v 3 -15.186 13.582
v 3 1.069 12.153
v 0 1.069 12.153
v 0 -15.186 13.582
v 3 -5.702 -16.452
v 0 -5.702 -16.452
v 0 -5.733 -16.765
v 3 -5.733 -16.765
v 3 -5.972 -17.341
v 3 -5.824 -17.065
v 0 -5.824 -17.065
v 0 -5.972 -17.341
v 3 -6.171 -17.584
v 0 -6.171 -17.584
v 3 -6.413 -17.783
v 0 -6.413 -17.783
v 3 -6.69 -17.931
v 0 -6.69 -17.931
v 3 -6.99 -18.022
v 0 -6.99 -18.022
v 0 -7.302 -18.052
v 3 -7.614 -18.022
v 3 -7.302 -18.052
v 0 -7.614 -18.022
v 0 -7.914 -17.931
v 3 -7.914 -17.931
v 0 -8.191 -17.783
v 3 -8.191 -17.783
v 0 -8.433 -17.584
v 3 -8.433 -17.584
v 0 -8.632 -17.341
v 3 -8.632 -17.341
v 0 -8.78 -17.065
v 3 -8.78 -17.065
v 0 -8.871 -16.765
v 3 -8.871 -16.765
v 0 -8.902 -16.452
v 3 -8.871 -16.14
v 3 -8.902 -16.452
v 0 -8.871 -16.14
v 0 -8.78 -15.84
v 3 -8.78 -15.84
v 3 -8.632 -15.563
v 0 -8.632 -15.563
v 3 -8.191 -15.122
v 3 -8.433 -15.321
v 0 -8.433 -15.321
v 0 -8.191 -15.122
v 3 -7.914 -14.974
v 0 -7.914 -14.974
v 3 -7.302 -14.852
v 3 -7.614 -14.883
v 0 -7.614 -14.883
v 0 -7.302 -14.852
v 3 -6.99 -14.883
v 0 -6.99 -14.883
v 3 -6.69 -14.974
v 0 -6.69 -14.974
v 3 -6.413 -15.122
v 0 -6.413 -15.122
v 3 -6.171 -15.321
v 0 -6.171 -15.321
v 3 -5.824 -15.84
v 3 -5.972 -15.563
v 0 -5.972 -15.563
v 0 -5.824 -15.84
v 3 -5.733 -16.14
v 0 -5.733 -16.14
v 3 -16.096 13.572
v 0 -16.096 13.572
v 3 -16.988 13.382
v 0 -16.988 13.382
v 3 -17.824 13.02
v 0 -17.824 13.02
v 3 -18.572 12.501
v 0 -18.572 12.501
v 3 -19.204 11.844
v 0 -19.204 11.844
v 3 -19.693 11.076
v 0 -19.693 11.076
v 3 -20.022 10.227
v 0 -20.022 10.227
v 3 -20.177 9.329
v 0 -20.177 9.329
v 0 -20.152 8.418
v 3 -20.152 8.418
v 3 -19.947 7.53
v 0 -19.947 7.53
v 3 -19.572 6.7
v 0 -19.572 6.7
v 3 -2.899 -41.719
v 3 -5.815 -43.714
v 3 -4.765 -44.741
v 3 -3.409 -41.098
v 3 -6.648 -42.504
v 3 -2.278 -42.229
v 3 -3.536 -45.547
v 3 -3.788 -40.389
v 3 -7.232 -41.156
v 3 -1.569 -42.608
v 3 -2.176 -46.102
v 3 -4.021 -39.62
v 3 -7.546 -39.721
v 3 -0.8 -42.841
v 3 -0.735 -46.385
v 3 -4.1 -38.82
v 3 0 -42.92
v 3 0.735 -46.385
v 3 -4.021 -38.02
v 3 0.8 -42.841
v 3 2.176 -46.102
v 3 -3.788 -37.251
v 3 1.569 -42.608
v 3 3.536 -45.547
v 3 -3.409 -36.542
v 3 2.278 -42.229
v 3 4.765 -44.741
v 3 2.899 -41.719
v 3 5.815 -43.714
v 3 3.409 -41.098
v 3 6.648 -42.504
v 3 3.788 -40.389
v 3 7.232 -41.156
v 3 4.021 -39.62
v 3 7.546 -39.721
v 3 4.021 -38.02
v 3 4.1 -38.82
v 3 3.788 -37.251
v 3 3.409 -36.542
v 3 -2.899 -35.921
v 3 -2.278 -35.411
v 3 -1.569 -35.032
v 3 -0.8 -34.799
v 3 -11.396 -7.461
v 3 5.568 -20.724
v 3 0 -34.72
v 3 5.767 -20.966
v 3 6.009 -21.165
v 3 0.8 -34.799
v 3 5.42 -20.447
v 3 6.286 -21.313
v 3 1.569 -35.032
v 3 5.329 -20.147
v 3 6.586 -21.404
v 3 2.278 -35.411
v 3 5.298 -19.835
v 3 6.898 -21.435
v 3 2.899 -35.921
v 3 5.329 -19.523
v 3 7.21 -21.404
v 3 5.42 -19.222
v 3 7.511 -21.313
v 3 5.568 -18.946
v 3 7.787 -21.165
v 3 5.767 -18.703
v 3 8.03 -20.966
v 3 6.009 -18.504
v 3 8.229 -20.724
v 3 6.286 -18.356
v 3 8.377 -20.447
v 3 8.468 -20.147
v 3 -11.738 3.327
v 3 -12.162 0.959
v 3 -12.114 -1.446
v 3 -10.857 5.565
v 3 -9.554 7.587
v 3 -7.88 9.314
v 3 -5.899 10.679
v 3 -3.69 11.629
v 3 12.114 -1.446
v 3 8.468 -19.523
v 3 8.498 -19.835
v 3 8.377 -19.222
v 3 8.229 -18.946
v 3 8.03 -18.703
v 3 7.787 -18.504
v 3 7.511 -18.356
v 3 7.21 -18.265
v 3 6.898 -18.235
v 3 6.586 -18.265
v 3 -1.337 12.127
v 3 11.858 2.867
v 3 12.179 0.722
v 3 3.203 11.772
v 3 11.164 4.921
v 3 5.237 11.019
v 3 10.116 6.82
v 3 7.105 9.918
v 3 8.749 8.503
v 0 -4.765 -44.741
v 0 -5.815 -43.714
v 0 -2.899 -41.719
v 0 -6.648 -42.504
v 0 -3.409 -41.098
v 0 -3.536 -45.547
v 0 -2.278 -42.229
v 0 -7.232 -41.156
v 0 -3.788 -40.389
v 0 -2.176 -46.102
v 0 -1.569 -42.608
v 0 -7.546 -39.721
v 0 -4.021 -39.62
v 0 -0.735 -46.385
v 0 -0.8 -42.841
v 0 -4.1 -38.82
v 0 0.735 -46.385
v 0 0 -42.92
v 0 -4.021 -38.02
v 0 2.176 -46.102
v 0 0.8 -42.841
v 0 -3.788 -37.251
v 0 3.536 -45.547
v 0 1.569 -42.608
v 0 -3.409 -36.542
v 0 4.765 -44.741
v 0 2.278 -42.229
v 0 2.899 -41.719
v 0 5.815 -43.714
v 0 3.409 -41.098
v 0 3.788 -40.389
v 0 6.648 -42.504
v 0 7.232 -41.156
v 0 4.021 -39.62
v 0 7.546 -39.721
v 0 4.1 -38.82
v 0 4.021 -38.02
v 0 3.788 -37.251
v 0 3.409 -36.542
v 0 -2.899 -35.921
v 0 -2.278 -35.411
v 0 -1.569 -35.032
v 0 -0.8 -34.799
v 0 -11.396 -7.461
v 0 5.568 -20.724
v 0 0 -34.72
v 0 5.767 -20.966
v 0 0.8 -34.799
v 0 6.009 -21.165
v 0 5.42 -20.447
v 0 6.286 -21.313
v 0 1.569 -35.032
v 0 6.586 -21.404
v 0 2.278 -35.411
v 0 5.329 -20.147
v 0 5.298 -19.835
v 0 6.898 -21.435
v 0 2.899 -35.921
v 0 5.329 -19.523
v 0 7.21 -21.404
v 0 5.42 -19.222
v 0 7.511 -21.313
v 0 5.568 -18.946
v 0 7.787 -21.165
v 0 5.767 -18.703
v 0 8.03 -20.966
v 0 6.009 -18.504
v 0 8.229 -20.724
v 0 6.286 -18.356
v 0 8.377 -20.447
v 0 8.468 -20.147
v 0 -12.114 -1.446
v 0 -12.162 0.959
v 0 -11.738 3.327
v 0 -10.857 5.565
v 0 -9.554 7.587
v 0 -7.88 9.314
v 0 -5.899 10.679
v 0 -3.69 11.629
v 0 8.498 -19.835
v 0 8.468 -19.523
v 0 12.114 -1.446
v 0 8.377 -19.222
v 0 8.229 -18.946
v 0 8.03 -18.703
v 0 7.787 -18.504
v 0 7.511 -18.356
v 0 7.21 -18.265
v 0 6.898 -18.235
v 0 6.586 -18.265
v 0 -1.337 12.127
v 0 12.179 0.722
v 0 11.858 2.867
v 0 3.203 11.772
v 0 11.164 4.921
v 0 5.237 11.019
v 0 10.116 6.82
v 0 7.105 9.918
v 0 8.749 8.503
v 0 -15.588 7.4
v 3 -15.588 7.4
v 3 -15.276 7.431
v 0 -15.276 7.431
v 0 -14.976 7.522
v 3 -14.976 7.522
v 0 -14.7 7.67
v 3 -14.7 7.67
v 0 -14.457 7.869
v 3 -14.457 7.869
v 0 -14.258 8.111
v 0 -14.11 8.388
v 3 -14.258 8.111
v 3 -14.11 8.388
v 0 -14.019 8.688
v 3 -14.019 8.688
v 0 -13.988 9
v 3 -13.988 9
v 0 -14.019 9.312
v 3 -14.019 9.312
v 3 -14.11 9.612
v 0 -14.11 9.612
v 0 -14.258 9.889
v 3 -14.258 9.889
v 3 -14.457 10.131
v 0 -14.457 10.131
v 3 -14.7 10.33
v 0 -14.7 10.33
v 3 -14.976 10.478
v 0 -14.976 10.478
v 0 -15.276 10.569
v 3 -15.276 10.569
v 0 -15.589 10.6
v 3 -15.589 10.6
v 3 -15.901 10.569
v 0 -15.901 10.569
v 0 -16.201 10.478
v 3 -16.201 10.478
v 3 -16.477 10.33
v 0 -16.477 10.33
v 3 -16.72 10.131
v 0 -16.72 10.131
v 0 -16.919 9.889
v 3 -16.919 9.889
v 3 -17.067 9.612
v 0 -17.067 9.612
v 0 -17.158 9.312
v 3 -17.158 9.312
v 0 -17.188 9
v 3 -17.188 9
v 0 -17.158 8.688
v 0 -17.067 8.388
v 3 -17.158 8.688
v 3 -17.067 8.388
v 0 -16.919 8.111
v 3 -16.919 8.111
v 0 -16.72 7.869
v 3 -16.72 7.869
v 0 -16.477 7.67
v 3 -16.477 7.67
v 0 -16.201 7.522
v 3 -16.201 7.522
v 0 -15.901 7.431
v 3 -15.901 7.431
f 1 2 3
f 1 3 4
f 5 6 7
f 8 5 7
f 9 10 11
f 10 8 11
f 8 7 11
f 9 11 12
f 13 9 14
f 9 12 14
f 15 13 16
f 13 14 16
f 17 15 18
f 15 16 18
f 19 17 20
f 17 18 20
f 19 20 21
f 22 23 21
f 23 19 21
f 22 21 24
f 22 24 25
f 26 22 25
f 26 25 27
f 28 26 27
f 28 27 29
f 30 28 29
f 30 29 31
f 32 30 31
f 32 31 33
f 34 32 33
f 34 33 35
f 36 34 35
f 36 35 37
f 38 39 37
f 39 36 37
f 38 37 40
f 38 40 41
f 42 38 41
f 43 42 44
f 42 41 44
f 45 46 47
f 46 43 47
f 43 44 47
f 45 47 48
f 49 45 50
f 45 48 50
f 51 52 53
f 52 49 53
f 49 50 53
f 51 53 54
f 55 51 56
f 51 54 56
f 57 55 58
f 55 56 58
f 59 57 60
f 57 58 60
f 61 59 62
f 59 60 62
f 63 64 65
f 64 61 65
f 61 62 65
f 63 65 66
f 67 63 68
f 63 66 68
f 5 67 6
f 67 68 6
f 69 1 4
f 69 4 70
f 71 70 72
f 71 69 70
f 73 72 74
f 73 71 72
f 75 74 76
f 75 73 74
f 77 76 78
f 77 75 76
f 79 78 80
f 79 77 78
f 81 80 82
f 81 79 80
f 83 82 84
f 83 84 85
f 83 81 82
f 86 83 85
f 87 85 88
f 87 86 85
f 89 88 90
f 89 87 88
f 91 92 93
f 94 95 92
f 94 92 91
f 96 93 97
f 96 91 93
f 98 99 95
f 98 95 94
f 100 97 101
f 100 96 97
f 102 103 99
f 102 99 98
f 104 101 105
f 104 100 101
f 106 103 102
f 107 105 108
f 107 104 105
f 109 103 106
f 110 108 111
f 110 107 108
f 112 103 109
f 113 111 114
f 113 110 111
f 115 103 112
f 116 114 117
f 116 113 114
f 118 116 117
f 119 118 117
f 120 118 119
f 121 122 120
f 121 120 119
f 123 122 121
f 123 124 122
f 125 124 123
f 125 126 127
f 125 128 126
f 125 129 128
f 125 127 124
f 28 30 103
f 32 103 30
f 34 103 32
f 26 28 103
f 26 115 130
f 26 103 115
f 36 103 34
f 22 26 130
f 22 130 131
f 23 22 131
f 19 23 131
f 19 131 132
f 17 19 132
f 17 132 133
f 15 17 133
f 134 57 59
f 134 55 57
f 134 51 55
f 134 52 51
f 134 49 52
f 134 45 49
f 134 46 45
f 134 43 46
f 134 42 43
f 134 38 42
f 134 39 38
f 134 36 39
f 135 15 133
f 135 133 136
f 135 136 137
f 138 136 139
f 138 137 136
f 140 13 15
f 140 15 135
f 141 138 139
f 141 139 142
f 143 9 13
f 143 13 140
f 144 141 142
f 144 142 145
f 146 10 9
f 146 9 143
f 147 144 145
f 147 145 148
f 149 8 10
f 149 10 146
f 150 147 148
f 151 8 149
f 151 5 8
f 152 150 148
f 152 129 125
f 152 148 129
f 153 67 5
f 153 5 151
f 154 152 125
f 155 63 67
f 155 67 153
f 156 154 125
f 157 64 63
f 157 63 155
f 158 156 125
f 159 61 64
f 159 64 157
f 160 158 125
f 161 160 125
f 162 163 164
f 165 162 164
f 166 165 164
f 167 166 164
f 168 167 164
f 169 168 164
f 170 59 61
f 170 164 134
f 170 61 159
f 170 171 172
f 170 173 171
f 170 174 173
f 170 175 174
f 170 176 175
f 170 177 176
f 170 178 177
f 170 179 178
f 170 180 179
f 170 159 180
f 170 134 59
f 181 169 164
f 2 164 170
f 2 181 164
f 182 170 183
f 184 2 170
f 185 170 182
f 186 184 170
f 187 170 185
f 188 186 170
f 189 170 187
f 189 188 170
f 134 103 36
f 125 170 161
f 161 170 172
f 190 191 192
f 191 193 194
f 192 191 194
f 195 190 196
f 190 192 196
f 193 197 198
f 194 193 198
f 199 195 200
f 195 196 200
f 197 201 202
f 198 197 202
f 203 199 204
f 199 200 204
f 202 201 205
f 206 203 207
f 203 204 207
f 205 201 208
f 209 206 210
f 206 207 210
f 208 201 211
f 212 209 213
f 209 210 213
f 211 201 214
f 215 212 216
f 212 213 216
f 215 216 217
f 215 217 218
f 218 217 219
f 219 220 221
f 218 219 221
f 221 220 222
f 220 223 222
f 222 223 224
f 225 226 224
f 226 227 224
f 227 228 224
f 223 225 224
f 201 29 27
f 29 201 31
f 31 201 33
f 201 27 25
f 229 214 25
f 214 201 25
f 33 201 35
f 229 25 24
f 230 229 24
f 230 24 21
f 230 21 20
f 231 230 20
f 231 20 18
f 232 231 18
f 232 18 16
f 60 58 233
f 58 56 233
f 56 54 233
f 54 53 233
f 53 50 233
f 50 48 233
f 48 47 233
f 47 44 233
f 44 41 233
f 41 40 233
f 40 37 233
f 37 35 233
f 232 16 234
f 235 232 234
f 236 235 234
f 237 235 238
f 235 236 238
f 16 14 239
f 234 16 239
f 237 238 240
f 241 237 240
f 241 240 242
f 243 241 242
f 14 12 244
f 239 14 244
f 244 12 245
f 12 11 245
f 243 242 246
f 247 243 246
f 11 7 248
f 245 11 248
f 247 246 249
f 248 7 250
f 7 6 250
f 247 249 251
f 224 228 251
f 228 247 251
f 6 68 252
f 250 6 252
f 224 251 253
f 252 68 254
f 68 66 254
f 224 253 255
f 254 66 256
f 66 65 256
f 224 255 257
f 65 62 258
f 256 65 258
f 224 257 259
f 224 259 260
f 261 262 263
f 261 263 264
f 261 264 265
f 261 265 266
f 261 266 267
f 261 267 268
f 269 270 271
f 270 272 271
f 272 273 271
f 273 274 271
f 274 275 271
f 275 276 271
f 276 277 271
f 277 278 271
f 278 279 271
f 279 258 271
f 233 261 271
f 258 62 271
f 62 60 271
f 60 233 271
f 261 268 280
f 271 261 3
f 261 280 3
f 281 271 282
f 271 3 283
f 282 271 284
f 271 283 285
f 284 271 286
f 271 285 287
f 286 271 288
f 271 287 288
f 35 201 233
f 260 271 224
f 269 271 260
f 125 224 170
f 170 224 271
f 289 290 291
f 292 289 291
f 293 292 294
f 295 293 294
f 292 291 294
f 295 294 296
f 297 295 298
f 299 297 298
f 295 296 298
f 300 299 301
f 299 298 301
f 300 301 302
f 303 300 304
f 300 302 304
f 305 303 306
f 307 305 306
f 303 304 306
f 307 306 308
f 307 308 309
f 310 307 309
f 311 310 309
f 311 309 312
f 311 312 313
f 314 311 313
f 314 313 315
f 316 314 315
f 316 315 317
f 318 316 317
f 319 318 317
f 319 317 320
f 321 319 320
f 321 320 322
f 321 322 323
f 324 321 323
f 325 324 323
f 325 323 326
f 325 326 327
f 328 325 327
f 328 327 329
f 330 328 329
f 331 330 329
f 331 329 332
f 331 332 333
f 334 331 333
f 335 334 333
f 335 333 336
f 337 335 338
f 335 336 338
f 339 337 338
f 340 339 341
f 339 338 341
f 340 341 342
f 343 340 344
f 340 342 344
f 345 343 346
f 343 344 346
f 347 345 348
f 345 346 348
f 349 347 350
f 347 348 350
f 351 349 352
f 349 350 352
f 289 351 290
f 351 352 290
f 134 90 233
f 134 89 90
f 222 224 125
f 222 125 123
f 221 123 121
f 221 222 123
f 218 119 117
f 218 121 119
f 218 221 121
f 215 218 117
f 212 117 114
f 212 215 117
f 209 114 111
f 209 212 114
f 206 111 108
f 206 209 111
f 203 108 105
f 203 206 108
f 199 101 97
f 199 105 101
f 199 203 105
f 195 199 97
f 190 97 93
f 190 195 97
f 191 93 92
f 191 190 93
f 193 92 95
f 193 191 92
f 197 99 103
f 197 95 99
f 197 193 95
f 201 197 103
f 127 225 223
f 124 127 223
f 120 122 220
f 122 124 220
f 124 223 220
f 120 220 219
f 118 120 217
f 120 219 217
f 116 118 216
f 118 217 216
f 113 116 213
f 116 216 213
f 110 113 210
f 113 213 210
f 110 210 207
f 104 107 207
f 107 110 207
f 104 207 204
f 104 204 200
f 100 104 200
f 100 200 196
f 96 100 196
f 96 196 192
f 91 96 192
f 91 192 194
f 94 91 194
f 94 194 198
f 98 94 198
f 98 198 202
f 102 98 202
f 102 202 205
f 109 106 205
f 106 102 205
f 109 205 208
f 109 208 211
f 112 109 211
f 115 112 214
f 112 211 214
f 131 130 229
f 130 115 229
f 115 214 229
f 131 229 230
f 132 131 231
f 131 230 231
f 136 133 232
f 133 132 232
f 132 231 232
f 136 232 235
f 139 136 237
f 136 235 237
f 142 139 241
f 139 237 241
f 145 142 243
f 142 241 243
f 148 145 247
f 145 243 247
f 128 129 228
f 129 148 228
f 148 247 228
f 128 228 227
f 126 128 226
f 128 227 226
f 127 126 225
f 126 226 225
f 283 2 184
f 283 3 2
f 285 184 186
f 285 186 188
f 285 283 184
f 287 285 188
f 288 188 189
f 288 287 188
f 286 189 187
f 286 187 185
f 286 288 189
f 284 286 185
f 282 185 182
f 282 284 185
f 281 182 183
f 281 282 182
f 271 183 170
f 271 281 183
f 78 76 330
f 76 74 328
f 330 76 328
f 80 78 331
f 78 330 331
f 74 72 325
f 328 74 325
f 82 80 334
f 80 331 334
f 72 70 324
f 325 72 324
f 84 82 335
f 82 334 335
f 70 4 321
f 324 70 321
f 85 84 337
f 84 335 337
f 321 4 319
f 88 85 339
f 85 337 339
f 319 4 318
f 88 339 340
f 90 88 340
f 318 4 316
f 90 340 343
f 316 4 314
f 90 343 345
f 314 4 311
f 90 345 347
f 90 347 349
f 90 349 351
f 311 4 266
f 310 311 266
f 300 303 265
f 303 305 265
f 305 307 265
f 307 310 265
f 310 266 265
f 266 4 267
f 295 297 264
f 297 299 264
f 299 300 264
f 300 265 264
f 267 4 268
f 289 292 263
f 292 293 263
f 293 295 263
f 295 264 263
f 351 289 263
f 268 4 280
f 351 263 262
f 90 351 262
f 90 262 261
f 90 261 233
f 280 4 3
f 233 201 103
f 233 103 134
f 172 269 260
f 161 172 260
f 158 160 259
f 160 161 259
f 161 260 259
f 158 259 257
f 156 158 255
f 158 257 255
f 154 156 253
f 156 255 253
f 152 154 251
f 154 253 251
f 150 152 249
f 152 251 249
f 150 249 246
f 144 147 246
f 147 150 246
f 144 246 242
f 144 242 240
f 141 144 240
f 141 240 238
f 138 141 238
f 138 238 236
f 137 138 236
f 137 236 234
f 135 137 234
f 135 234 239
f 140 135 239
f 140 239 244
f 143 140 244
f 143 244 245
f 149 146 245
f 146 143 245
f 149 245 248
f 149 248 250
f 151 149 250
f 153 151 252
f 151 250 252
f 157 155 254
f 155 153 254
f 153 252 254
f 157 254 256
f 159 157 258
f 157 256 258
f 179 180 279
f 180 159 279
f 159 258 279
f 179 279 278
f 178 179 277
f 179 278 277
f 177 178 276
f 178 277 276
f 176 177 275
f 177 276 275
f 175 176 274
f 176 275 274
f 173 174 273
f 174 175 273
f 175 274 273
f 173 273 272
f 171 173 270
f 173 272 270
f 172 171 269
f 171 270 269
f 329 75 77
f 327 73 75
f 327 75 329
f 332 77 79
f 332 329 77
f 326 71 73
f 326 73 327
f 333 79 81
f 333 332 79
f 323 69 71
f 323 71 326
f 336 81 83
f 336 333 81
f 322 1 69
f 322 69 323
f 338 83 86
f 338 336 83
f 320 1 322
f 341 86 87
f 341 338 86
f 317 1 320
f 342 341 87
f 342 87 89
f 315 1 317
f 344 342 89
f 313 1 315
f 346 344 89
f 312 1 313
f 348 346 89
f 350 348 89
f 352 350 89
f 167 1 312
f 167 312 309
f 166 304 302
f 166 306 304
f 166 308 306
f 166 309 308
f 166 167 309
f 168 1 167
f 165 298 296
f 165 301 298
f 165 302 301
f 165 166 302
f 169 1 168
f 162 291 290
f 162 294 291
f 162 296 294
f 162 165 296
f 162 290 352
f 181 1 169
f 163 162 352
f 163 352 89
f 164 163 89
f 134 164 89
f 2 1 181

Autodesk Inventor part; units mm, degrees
ref_plane "YZ Plane" through (0, 0, 0) normal (1, 0, 0) x (0, 1, 0)
ref_plane "XZ Plane" through (0, 0, 0) normal (0, 1, 0) x (-1, 0, 0)
ref_plane "XY Plane" through (0, 0, 0) normal (0, 0, 1) x (1, 0, 0)
sketch "Эскиз1" plane through (0, 0, 0) normal (1, 0, 0) x (0, 1, 0)
  circle A0 centre (35.2311, -22.6062) radius 9.3
  circle A1 centre (0, -38.8201) radius 6.1 construction
  circle A2 centre (0, 0) radius 4.85 construction
  circle A3 centre (35.8147, -49.5529) radius 3.55
  line L0 (6.0968, -38.6237) -> (4.8475, 0.1562) construction
  line L1 (-4.8475, 0.1562) -> (-6.0968, -38.6237) construction
  line L2 (0, 0) -> (0, -38.8201) construction
  circle A4 centre (0, -38.8201) radius 4.1
  circle A5 centre (0, 0) radius 2.25
  circle A6 centre (0, -38.8201) radius 15 construction
  circle A7 centre (0, 0) radius 14 construction
  circle A8 centre (0, -38.8201) radius 7.6
  circle A9 centre (0, 0) radius 7 construction
  line L3 (7.5465, -39.7207) -> (12.114, -1.4456)
  line L4 (-7.5465, -39.7207) -> (-12.114, -1.4456)
  circle A10 centre (0, 0) radius 8.8 construction
  circle A11 centre (0, 0) radius 12.2
  circle A12 centre (6.8983, -19.8347) radius 1.6
  circle A13 centre (-7.3019, -16.4524) radius 1.6
  point P0 (-7, 0)
  point P1 (-7.5465, -39.7207)
  point P2 (-12.114, -1.4456)
  dimension "d0" = 18.6
  dimension "d1" = 12.2
  dimension "d2" = 9.7
  dimension "d3" = 7.1
  dimension "d8" = 38.8201
  dimension "d13" = 38.8
  dimension "d14" = 38.8
  dimension "d23" = 8.2
  dimension "d24" = 4.5
  dimension "d25" = 30
  dimension "d26" = 28
  dimension "d28" = 14
  dimension "d31" = 17.6
  dimension "d32" = 3.4
  dimension "d56" = 3.5
  dimension "d58" = 3.2
  dimension "d59" = 3
  dimension "d60" = 21
  dimension "d61" = 3.2
  dimension "d62" = 3
  dimension "d63" = 18
extrude "Выдавливание4" add sketch "Эскиз1" along normal blind 3 contours A5 | A8 | A8 L4 A11 L3 | A11
sketch "Эскиз4" plane through (0, 0, 0) normal (-1, 0, 0) x (0, 0, 1)
  circle A0 centre (-6.2, 6.2) radius 1.4
  circle A1 centre (-38.8201, 0) radius 4.1 construction
  arc A2 (-1.4456, -12.114) -> (-1.4456, 12.114) centre (0, 0) ccw construction
  line L0 (-39.7207, 7.5465) -> (-1.4456, 12.114) construction
  arc A3 (-39.7207, 7.5465) -> (-39.7207, -7.5465) centre (-38.8201, 0) ccw construction
  line L1 (-1.4456, -12.114) -> (-39.7207, -7.5465) construction
  line L2 (0, 0) -> (0, 12.2) construction
  arc A4 (-1.4456, -12.114) -> (-1.4456, 12.114) centre (0, 0) ccw construction
  line L3 (0, 0) -> (12.2, 0) construction
  circle A5 centre (6.2, 6.2) radius 1.4
  circle A6 centre (-6.2, -6.2) radius 1.4
  circle A7 centre (6.2, -6.2) radius 1.4
  dimension "d33" = 2.8
  dimension "d34" = 12.4
  dimension "d35" = 12.4
extrude "Выдавливание5" [suppressed]
sketch "Эскиз5" plane through (3, 0, 0) normal (1, 0, 0) x (0, 0, -1)
  circle A0 centre (0, 0) radius 3.75
  dimension "d38" = 7.5
extrude "Выдавливание6" [suppressed]
sketch "Эскиз6" plane through (3, 0, 0) normal (1, 0, 0) x (0, 0, -1)
  circle A0 centre (0, -18) radius 2
  circle A1 centre (38.8201, 0) radius 4.1 construction
  line L0 (39.7207, 7.5465) -> (1.4456, 12.114) construction
  arc A2 (1.4456, 12.114) -> (1.4456, -12.114) centre (0, 0) ccw construction
  line L1 (1.4456, -12.114) -> (39.7207, -7.5465) construction
  arc A3 (39.7207, -7.5465) -> (39.7207, 7.5465) centre (38.8201, 0) ccw construction
  line L2 (0, 0) -> (0, -26.6004) construction
  circle A4 centre (0, 0) radius 14 construction
  line L3 (-10.8605, -5.5578) -> (-3.5608, -19.8222)
  arc A5 (0, -14) -> (-3.5608, -19.8222) centre (0, -18) ccw construction
  line L4 (2.8284, -20.8284) -> (12.911, -10.7458)
  line L5 (1.4456, -12.114) -> (39.7207, -7.5465) construction
  arc A6 (2.8284, -20.8284) -> (0, -14) centre (0, -18) ccw construction
  arc A7 (-3.5608, -19.8222) -> (2.8284, -20.8284) centre (0, -18) ccw
  line L6 (-10.8605, -5.5578) -> (-10.1465, -5.5578)
  line L7 (-10.1465, -5.5578) -> (-6.8136, -9.4237)
  line L8 (-6.8136, -9.4237) -> (5.1237, -10.512)
  line L9 (5.1237, -10.512) -> (12.911, -10.7458)
  dimension "d42" = 28
  dimension "d41" = 4
  dimension "d43" = 18
  dimension "d44" = 8
  dimension "d45" = 45
extrude "Выдавливание7" [suppressed]
sketch "Эскиз7" plane through (3, 0, 0) normal (1, 0, 0) x (0, 0, -1)
  line L0 (0, 0) -> (0, -29.4139) construction
  circle A0 centre (-9, -15.5885) radius 1.6
  line L1 (-9, -15.5885) -> (0, 0) construction
  circle A1 centre (0, 0) radius 14 construction
  circle A2 centre (0, 0) radius 18 construction
  arc A3 (-6.7, -19.5722) -> (-13.5823, -15.1855) centre (-9, -15.5885) ccw construction
  circle A4 centre (38.8201, 0) radius 4.1 construction
  line L2 (39.7207, 7.5465) -> (1.4456, 12.114) construction
  arc A5 (1.4456, 12.114) -> (1.4456, -12.114) centre (0, 0) ccw projected
  line L3 (1.4456, -12.114) -> (39.7207, -7.5465) projected
  arc A6 (39.7207, -7.5465) -> (39.7207, 7.5465) centre (38.8201, 0) ccw construction
  line L4 (-12.1531, 1.0686) -> (-13.5823, -15.1855)
  line L5 (-6.7, -19.5722) -> (7.4613, -11.3962)
  line L6 (1.4456, -12.114) -> (39.7207, -7.5465) construction
  arc A7 (-13.5823, -15.1855) -> (-6.7, -19.5722) centre (-9, -15.5885) ccw
  point P0 (7.4613, -11.3962)
  dimension "d48" = 3.2
  dimension "d49" = 330
  dimension "d50" = 28
  dimension "d51" = 4
  dimension "d53" = 30
  dimension "d57" = 3
extrude "Выдавливание8" add sketch "Эскиз7" against normal up to surface (3 mm away)
properties part number "left_wall_v1"
